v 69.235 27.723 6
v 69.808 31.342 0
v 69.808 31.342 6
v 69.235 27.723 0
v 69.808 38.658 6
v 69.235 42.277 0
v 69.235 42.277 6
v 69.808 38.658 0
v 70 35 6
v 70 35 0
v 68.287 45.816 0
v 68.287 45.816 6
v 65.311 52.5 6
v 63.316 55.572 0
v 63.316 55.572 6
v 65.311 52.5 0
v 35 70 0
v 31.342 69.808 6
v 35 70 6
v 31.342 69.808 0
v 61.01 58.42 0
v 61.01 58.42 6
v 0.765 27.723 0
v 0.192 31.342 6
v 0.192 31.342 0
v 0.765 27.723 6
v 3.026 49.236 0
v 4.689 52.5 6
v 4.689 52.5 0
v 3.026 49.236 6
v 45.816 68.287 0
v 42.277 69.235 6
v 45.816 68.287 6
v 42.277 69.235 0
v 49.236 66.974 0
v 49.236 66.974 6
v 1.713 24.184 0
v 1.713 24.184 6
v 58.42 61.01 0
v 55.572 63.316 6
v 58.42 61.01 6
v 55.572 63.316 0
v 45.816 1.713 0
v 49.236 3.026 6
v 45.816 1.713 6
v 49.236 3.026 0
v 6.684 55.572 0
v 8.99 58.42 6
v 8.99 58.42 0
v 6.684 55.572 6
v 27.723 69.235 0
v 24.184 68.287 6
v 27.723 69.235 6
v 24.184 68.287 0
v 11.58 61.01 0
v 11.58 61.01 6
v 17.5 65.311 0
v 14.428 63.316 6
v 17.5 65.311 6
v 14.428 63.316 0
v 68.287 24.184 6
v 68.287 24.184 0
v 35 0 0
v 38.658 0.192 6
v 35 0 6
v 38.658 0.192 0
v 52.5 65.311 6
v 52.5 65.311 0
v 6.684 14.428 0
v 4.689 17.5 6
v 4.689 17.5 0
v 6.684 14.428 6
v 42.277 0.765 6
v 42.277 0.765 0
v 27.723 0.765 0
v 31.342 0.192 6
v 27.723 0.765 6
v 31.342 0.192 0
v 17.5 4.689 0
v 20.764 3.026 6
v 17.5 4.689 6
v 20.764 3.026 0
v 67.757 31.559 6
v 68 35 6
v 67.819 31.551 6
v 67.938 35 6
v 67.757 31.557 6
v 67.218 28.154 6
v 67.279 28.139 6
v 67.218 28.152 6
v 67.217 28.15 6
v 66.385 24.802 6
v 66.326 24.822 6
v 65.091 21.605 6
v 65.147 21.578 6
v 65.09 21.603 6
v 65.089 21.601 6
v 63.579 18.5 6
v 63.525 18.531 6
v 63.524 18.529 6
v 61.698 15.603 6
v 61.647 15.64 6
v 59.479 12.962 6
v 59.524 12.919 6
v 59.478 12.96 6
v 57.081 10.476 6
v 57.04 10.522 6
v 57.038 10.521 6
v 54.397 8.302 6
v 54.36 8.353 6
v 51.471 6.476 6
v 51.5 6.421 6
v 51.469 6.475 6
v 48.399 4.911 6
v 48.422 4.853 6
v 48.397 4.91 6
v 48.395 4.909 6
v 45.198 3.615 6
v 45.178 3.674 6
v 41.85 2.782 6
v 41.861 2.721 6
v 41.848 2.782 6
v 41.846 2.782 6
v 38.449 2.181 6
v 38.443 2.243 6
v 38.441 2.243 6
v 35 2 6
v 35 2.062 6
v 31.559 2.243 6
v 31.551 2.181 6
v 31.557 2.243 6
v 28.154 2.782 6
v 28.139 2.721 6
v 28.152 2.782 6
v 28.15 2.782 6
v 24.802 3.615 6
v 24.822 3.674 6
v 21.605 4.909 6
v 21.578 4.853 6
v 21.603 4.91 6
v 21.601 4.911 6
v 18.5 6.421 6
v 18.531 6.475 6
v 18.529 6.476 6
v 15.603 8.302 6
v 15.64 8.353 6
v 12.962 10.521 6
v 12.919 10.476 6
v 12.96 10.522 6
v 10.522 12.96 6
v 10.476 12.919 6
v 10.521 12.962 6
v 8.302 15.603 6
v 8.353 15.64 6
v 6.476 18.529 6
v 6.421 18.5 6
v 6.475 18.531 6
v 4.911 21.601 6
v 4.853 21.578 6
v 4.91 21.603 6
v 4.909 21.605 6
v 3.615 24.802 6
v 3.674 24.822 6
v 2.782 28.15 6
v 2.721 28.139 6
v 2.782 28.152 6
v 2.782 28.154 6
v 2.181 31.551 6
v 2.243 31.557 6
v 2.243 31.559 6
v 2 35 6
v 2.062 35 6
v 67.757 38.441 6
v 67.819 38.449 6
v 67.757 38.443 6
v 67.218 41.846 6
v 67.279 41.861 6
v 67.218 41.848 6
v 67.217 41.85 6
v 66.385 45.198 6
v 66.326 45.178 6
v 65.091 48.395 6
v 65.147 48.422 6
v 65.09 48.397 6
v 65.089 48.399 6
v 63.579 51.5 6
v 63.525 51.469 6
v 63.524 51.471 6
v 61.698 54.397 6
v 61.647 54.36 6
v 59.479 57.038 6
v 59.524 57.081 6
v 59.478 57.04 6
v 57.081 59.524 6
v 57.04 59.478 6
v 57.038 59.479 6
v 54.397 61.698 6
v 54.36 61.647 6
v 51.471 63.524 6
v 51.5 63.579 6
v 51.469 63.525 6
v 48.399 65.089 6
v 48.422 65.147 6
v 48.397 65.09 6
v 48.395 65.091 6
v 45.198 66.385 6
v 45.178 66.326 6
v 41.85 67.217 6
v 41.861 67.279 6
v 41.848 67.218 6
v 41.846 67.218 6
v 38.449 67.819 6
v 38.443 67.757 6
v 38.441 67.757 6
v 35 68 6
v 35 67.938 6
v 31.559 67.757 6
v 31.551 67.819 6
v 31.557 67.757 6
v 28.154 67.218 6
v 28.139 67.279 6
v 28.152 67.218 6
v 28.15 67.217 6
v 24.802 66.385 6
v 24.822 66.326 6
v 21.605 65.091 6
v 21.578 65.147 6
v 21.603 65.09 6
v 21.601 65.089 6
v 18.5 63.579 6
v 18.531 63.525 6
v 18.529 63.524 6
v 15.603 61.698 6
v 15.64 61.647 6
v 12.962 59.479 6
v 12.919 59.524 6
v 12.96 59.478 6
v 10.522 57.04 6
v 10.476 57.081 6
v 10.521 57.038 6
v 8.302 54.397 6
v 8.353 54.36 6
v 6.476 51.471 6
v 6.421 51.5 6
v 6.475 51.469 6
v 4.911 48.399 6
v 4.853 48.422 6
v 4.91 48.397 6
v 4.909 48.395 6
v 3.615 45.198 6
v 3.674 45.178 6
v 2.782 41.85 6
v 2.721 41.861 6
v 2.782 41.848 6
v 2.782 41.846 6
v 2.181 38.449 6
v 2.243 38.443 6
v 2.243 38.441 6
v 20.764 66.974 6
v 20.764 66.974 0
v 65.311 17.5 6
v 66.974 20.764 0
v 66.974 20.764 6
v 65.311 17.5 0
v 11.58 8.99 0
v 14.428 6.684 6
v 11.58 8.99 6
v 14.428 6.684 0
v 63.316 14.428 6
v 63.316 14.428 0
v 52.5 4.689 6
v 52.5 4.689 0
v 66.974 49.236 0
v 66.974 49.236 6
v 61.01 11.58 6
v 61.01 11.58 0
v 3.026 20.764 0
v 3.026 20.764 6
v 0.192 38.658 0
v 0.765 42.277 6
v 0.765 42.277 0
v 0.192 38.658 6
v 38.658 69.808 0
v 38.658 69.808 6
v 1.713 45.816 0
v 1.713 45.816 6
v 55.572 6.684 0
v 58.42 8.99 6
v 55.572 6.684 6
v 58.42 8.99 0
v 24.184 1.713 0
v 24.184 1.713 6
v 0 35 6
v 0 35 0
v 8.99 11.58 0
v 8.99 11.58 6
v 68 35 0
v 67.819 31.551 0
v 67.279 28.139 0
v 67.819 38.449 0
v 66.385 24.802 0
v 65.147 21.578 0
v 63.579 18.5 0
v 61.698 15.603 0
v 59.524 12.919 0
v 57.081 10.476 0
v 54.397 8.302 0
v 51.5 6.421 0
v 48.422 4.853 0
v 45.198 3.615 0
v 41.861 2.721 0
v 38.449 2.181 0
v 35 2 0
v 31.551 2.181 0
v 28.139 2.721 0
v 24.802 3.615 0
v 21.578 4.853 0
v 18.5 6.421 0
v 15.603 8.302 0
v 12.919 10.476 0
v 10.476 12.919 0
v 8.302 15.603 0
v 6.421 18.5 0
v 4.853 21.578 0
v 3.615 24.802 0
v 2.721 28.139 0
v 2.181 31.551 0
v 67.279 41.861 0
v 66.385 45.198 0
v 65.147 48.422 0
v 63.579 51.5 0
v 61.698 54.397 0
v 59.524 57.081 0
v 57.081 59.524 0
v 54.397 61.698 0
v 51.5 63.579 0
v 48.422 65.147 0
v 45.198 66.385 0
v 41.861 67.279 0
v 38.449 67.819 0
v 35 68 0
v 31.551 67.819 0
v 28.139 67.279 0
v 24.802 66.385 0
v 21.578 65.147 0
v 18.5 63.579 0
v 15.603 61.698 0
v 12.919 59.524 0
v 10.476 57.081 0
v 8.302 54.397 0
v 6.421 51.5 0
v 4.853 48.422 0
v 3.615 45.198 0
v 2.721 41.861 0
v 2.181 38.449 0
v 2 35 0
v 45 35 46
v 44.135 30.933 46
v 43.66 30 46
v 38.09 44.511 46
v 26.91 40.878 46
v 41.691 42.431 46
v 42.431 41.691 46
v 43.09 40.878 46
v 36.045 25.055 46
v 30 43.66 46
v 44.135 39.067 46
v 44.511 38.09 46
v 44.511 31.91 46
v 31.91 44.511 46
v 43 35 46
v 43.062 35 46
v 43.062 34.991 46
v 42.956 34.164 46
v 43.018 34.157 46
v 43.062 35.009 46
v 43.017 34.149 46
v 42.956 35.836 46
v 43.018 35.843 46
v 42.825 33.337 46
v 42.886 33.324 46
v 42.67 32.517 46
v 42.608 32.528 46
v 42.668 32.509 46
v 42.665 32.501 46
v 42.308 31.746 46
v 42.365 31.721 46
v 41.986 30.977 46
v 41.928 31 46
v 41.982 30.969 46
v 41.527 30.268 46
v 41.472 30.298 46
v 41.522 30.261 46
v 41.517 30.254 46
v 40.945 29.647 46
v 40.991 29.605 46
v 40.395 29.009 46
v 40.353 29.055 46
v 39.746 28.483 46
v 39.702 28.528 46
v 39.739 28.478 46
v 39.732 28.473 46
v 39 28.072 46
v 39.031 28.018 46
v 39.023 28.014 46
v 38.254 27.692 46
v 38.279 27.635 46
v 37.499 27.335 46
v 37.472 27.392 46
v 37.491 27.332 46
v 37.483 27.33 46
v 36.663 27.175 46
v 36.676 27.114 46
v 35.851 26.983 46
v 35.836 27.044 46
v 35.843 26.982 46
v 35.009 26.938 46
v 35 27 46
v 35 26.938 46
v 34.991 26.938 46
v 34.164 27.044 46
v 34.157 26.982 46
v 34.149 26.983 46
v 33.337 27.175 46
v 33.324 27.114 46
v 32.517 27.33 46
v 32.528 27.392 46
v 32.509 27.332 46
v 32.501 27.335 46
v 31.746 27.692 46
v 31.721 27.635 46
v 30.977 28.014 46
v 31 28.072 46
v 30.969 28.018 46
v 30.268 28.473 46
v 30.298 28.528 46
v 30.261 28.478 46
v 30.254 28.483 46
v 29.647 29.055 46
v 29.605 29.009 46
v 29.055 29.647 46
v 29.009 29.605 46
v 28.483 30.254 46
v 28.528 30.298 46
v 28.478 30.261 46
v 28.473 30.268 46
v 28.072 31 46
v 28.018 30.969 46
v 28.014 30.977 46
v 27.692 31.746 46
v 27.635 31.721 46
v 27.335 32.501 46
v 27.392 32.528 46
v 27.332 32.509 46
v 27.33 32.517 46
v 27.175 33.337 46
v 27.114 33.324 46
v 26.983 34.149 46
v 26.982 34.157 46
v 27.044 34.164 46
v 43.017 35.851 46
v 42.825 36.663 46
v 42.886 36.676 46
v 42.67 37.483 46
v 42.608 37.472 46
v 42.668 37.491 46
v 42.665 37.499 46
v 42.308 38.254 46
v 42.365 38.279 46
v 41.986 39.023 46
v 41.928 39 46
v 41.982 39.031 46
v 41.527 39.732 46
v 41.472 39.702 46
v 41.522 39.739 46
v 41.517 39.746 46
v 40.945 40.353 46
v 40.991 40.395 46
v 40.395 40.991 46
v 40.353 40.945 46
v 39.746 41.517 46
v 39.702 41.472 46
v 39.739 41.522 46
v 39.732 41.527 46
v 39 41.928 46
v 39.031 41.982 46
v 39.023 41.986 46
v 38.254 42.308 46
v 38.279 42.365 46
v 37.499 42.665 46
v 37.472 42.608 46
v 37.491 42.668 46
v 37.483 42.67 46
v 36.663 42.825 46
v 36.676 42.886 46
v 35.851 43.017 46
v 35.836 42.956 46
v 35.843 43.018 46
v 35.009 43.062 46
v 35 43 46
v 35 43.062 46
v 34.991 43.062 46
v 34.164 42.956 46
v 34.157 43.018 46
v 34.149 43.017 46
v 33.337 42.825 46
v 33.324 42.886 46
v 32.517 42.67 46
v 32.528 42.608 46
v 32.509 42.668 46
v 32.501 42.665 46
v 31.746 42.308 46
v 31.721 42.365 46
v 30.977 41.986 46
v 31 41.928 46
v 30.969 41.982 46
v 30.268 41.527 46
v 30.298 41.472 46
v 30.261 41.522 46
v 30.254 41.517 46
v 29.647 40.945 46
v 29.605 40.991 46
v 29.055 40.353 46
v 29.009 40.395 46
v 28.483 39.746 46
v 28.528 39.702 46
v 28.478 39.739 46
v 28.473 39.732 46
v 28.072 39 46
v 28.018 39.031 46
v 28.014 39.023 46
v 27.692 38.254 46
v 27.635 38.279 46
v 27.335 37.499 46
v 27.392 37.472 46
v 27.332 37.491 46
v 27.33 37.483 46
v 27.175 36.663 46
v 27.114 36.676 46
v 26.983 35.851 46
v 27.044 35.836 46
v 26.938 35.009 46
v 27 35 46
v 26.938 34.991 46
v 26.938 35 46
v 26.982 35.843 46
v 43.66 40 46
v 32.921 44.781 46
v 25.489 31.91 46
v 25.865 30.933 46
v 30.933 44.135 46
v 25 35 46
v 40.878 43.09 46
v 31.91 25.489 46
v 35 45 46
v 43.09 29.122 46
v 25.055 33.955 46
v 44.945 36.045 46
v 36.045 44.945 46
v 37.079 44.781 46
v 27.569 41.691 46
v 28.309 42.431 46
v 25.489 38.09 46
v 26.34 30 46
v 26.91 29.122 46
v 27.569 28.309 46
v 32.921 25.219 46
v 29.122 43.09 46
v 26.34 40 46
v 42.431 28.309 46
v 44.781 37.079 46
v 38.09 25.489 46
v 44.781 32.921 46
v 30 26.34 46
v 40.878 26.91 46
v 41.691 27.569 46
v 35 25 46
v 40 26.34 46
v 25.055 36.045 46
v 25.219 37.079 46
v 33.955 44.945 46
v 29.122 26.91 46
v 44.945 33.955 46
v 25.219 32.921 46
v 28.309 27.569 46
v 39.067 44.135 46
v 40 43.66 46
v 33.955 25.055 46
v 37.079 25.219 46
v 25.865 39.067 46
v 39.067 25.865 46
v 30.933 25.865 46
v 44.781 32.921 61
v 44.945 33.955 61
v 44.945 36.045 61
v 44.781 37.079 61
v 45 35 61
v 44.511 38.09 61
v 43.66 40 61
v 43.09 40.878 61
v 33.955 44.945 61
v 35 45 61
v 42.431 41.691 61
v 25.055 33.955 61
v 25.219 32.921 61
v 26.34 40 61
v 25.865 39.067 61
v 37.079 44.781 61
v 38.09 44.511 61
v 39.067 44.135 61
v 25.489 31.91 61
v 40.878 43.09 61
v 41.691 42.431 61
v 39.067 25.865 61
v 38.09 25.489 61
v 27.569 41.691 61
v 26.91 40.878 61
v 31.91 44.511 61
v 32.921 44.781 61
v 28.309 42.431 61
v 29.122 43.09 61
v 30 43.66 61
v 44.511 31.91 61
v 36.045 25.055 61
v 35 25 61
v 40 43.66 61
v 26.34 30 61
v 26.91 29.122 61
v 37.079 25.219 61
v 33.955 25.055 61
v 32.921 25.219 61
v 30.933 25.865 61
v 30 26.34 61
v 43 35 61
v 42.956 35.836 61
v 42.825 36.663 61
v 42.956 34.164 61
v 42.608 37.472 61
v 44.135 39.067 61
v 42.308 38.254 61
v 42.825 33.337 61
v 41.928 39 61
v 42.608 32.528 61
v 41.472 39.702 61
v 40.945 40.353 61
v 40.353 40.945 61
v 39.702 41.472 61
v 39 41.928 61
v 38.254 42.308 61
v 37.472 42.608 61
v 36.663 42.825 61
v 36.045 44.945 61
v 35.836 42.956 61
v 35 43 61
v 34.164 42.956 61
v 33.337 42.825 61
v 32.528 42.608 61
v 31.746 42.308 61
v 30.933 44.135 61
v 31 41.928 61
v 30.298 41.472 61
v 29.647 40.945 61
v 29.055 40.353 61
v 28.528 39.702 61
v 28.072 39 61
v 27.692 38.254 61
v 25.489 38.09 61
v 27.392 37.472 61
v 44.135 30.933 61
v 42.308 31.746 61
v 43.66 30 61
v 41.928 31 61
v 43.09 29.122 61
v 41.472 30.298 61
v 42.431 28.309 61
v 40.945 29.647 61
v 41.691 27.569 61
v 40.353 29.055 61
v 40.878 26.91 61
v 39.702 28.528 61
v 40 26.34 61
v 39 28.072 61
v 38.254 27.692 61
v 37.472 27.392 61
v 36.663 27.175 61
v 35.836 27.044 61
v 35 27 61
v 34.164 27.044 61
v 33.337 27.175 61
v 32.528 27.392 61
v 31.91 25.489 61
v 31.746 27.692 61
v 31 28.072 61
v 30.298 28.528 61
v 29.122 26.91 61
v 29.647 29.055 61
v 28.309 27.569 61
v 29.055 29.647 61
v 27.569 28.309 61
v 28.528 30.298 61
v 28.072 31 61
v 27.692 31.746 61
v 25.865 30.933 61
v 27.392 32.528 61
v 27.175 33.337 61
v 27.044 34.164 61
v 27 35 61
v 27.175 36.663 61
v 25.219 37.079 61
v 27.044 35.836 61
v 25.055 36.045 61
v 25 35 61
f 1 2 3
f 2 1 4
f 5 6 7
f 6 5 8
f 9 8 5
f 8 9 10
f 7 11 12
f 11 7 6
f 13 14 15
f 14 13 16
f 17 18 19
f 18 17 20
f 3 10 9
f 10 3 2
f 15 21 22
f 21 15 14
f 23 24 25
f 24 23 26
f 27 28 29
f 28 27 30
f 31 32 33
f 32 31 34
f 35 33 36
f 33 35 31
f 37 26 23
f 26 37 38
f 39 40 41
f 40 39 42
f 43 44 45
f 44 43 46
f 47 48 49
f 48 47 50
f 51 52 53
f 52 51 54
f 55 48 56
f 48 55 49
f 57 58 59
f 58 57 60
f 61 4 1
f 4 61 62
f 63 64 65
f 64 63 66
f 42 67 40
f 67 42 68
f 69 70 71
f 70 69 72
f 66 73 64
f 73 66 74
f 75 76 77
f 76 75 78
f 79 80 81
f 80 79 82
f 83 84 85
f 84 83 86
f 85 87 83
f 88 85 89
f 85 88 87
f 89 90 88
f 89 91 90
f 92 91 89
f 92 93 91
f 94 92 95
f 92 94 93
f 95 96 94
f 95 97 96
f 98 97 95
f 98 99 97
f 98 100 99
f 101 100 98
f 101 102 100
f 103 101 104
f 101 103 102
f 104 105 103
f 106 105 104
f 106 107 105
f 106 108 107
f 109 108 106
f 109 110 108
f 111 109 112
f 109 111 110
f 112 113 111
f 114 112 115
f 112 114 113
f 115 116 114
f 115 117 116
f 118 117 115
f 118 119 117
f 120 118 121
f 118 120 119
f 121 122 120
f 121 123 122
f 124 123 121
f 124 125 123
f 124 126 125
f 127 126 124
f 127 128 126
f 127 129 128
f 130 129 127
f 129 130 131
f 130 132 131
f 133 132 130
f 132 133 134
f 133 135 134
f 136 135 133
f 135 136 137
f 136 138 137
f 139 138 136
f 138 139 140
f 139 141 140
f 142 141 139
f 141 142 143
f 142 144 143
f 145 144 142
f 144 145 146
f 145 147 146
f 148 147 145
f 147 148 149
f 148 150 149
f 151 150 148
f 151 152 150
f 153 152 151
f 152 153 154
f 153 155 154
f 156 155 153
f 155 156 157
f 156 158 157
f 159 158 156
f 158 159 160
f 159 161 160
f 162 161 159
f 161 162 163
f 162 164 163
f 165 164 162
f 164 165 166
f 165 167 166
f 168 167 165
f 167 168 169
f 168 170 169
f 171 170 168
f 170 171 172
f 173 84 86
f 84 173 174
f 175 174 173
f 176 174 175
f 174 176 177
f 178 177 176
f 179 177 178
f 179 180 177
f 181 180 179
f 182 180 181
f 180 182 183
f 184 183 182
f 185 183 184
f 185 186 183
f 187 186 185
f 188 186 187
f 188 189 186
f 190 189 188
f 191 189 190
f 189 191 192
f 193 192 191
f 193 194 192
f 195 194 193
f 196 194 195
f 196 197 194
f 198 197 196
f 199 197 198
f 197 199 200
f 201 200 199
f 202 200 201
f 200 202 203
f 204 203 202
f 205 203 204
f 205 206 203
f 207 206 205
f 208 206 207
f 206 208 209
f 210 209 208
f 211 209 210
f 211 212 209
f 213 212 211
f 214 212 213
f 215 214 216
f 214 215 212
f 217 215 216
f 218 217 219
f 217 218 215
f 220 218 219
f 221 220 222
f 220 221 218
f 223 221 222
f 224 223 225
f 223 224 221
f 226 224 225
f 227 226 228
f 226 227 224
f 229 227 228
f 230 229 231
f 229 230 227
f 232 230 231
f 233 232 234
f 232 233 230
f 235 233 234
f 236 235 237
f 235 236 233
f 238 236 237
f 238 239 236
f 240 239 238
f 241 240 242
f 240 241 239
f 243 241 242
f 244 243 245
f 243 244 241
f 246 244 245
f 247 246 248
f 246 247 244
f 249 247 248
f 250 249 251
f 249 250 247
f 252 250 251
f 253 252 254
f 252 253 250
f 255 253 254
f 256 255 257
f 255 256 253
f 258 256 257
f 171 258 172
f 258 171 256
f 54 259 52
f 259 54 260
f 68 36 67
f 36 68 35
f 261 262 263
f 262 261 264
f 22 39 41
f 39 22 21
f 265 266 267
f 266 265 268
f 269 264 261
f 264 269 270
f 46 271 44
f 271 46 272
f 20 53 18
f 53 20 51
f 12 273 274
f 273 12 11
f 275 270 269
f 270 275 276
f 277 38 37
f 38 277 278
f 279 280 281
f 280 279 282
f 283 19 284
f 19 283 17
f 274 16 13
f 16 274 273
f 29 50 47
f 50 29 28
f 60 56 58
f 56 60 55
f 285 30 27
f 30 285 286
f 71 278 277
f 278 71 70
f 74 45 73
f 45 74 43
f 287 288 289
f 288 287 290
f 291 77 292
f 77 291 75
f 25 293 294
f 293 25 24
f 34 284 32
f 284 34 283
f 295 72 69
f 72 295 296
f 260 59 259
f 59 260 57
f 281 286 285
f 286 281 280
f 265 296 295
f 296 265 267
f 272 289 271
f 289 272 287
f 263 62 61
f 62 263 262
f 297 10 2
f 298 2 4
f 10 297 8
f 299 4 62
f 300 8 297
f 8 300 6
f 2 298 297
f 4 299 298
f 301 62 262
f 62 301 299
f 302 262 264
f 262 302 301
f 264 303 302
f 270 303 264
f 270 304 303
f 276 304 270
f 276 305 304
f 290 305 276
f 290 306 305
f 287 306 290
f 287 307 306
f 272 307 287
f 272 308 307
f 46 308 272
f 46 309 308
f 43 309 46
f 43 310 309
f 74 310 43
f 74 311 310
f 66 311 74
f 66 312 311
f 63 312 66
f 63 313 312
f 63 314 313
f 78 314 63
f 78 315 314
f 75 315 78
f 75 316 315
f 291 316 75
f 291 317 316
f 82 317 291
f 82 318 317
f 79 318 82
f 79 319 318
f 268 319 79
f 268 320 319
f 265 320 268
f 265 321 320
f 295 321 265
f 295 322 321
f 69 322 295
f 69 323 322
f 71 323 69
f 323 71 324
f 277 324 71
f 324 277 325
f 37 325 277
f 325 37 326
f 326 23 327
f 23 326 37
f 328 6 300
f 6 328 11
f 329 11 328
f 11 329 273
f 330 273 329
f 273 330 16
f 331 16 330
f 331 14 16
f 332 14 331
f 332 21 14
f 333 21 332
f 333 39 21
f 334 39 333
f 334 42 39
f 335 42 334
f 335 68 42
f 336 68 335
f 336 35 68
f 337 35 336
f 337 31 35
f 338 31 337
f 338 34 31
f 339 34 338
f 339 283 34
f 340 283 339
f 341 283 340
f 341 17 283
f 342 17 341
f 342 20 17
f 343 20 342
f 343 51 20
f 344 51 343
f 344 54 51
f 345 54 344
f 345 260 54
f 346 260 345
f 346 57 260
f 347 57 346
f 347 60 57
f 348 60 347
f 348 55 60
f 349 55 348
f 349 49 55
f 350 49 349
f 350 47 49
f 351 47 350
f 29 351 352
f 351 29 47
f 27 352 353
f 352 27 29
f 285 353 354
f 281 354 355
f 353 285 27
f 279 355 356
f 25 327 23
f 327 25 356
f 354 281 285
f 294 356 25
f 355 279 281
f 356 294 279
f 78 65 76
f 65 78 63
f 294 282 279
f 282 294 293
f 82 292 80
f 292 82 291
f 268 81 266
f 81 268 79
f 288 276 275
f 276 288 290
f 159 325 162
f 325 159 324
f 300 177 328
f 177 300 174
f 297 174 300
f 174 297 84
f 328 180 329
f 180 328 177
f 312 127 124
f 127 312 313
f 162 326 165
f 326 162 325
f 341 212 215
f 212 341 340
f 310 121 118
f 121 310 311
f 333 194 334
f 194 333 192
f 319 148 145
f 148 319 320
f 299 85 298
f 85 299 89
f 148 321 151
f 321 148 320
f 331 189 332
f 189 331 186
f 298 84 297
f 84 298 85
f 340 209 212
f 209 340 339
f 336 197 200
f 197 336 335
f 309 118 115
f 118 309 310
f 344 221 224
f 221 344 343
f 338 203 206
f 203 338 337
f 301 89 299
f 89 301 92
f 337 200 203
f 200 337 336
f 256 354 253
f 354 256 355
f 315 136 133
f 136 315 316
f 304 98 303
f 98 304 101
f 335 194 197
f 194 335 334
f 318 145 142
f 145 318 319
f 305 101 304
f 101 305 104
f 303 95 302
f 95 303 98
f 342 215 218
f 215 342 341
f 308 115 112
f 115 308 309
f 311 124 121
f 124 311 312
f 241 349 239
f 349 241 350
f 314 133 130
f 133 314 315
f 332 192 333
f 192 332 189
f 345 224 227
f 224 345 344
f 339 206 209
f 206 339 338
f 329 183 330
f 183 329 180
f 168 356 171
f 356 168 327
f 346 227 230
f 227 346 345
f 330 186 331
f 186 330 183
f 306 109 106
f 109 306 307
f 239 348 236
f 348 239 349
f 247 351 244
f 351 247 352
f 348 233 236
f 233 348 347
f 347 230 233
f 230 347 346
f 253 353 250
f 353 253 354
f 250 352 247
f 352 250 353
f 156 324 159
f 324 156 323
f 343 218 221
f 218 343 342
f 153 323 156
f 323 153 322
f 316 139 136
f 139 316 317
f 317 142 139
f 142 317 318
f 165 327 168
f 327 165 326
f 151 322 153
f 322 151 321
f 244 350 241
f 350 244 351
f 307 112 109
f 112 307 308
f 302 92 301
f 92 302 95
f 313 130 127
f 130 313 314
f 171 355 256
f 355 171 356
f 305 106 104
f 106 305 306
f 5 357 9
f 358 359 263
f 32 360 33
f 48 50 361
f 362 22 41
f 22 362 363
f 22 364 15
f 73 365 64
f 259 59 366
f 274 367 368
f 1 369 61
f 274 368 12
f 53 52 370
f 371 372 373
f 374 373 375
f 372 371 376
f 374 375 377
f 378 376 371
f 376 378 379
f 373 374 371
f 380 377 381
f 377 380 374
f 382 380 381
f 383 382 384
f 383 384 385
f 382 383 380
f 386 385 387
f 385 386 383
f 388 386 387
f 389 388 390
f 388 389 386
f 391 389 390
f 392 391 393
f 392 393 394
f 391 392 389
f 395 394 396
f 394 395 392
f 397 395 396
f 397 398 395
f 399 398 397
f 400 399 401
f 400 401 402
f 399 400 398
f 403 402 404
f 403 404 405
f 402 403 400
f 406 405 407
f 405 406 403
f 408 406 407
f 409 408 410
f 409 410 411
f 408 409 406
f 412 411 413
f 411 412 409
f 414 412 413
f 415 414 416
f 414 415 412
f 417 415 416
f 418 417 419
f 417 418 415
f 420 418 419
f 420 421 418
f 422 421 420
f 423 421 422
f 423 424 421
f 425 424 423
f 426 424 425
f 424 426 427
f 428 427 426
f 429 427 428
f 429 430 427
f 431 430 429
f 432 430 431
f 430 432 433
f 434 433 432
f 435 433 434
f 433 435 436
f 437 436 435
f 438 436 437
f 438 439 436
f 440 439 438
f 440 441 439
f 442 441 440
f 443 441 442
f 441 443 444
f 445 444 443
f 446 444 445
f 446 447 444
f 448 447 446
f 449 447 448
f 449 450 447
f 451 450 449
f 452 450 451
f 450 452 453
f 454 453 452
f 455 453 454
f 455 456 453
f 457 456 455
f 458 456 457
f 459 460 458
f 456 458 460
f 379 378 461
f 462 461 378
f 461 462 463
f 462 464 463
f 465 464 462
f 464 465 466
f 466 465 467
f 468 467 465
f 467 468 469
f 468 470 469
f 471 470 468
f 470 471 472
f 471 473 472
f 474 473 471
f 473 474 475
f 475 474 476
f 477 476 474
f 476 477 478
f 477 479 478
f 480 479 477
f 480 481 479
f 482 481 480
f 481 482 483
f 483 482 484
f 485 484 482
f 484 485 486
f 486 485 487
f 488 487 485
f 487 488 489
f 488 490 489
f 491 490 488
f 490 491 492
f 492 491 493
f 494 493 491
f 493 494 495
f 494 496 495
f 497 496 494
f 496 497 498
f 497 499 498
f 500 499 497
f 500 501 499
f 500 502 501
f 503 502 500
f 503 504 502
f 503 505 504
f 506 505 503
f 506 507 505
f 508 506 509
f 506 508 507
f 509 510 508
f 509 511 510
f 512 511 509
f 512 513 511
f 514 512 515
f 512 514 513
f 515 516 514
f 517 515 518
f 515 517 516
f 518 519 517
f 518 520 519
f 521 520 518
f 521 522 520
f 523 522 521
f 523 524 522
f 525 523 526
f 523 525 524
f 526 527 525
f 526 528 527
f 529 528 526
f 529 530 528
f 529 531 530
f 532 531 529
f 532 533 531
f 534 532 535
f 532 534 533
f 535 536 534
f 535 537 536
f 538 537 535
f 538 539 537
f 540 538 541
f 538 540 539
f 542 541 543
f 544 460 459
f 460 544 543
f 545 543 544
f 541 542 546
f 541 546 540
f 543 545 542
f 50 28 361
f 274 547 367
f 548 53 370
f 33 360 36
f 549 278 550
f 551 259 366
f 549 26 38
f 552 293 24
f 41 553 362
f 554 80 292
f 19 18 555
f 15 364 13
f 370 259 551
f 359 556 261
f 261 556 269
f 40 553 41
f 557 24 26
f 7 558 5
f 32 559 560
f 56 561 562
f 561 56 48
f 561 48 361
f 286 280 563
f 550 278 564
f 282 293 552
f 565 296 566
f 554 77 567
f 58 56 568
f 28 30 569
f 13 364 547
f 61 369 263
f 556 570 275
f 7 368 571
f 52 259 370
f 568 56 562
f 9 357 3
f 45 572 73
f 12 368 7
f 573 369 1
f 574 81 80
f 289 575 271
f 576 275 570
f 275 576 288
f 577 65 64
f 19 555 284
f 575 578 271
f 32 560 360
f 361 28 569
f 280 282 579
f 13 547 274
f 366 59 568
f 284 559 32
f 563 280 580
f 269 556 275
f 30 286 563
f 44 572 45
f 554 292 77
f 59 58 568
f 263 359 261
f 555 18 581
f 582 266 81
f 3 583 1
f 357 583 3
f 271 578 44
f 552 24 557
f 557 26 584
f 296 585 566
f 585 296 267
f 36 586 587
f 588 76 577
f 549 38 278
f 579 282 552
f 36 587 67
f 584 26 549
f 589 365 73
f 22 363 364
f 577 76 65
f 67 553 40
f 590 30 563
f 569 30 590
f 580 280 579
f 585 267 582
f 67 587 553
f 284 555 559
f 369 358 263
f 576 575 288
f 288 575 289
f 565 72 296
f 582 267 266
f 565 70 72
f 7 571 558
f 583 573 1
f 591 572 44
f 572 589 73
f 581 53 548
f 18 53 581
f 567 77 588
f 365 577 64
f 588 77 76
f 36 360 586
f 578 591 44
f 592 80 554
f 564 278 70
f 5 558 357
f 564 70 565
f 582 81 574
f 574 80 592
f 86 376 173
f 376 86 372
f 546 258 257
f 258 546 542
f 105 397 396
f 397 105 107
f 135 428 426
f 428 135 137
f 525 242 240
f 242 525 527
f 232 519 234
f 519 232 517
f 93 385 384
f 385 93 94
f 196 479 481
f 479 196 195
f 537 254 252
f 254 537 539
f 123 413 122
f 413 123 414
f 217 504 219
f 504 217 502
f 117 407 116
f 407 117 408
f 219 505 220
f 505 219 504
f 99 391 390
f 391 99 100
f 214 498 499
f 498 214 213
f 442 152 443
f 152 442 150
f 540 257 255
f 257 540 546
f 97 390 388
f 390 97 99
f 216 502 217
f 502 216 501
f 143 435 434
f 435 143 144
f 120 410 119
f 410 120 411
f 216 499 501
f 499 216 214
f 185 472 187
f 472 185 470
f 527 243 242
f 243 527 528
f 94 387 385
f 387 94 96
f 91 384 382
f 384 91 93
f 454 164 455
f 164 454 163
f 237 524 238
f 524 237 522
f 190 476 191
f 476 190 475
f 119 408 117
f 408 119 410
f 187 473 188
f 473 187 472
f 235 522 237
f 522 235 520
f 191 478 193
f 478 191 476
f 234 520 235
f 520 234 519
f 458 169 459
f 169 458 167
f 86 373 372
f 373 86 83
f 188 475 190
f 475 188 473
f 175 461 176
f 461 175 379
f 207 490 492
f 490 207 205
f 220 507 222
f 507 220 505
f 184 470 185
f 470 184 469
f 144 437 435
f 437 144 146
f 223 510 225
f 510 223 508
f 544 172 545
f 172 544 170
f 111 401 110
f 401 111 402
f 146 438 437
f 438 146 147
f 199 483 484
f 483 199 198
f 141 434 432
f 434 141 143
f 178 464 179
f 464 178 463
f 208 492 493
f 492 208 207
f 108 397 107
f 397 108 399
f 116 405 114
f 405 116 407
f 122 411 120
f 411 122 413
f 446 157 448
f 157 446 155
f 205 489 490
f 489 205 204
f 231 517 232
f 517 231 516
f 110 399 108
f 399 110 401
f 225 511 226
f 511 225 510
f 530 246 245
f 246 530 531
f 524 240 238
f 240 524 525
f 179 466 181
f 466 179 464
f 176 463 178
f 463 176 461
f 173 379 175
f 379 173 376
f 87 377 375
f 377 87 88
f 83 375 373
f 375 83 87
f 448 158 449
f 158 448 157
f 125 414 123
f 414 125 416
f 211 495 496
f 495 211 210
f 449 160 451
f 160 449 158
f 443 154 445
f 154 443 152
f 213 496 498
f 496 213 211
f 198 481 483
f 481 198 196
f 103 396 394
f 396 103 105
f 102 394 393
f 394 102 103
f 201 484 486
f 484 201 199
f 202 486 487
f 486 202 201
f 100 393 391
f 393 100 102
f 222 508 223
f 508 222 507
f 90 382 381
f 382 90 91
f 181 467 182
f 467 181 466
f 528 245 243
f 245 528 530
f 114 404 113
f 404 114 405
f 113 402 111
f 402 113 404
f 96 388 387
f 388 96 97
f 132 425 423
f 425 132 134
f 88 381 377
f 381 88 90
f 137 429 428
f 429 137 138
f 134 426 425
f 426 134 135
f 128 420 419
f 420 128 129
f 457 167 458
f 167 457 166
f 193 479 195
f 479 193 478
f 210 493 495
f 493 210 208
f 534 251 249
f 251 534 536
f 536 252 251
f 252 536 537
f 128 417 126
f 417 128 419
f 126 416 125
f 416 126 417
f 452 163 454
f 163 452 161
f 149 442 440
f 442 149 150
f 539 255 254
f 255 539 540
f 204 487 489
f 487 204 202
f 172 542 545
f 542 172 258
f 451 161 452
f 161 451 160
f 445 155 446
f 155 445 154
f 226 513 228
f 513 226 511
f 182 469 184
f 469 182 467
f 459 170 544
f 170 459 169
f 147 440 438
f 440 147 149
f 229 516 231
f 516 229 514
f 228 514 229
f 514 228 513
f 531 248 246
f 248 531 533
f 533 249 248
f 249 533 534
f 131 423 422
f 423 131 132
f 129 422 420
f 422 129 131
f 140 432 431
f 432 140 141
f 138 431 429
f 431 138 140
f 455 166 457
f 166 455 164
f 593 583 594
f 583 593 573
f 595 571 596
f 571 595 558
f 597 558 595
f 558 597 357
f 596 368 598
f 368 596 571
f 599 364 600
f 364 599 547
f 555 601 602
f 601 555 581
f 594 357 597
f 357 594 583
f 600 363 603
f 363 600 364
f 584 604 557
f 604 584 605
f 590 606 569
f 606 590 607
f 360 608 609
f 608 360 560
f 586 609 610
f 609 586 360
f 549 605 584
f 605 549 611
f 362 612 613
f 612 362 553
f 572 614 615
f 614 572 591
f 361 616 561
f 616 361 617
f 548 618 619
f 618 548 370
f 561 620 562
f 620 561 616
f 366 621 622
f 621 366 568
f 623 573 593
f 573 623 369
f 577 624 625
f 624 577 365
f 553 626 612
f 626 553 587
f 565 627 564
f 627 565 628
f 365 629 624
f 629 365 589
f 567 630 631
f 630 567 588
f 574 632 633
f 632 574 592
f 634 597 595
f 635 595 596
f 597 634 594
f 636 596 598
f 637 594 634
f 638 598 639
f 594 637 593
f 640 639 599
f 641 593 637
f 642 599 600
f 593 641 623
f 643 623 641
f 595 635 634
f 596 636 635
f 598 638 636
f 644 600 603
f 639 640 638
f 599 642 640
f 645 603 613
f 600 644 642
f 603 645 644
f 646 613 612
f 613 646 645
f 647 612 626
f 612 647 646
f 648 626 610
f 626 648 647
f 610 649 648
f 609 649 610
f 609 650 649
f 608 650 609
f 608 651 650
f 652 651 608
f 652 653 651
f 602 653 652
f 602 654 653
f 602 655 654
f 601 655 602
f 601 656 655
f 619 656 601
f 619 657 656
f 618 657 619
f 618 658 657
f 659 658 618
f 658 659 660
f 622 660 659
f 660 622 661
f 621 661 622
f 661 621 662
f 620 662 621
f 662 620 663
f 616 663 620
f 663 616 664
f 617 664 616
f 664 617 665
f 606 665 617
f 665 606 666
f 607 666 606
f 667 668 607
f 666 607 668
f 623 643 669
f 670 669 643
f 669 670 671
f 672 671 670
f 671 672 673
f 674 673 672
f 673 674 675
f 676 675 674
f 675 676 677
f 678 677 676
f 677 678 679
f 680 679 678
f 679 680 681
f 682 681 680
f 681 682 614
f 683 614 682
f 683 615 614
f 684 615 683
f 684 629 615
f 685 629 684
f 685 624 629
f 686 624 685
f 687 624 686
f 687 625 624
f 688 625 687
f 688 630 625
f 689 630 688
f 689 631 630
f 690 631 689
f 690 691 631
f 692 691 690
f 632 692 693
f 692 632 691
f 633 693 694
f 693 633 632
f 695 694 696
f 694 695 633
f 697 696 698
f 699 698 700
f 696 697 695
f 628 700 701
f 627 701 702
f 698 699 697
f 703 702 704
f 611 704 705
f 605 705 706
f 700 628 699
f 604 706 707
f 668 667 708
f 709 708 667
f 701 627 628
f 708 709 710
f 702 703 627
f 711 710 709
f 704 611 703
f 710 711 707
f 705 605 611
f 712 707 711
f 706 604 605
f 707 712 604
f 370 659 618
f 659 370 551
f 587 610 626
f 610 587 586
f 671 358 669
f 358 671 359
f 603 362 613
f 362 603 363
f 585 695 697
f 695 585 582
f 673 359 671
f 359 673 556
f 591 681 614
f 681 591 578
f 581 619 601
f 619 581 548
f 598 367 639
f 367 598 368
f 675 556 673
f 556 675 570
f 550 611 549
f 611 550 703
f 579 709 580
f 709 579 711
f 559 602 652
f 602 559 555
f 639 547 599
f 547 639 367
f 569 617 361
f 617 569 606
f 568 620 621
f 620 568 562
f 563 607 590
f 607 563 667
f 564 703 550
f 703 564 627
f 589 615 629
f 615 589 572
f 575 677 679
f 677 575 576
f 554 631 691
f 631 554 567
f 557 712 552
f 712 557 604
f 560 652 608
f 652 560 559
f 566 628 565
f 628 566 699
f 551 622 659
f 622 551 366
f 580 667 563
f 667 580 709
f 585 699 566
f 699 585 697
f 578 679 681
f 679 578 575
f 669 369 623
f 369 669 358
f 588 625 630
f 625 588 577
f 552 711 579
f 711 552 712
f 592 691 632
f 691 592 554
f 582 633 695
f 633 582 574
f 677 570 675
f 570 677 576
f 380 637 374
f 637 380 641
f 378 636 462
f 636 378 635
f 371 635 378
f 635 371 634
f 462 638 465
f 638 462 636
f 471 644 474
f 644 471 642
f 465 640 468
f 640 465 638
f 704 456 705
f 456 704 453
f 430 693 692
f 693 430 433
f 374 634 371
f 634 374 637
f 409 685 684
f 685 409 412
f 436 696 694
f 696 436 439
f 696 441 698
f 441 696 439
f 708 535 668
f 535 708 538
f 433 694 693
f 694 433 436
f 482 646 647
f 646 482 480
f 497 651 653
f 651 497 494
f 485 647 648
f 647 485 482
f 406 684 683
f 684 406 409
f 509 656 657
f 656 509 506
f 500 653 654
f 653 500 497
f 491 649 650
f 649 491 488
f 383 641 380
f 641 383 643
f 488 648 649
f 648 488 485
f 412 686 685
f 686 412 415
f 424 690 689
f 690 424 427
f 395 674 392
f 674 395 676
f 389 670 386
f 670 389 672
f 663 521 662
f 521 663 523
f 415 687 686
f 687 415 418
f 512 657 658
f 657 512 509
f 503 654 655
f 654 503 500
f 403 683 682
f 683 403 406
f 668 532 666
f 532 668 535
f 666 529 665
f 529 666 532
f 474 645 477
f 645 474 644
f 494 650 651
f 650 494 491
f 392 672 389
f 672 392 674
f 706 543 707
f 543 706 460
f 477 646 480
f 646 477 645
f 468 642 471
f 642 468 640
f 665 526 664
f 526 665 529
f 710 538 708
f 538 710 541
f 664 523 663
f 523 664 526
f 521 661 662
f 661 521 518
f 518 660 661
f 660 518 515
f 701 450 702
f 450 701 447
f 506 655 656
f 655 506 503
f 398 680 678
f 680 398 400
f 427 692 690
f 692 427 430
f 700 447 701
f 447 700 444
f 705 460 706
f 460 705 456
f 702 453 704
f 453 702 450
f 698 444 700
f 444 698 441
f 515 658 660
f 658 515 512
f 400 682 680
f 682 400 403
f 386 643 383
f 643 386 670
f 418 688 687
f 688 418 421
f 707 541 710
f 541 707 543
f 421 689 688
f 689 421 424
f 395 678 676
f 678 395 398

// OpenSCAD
// =============================================
// 3D: funnel — воронка из 3 модулей
// Version: 1.0
// =============================================

description = "Parametric funnel: base ring, conical body, neck"; // one-line short description
version_str = "1.0";

// -------------------------------------------------
// Комментарии / Состав фрагментов
// -------------------------------------------------
// Фрагменты (все размеры задаются ниже параметрами):
// - p1_base()   — нижнее основание (цилиндр‑обод) высотой P1_H и диаметром P1_D
// - p2_frustum()— конический участок (усечённый конус) высотой P2_H
// - p3_neck()   — горлышко (цилиндр) высотой P3_H и диаметром P3_D
// Главная деталь base() = union(p1_base, p2_frustum, p3_neck)

// -------------------------------------------------
// Параметры модели (внешние габариты) и настройки
// -------------------------------------------------
// Геометрия
P1_D = 70;     // нижний внешний диаметр основания (мм)
P1_H = 6;      // высота основания (мм)
P2_H = 40;     // высота усечённого конуса (мм)
P3_D = 20;     // внешний диаметр горлышка (мм)
P3_H = 15;     // высота горлышка (мм)

wall_th = 2.0; // толщина стенок воронки (мм)

// Фаски/скругления (минимальные по умолчанию)
edge_ch_base = 0;   // фаска по верхнему краю основания (мм)
edge_ch_neck = 0;   // фаска по верхнему краю горлышка (мм)

// Опциональное скругление краёв всей детали через Minkowski
// Примечание: если mink_r > 0, внешние габариты увеличатся примерно на 2*mink_r
mink_r = 0;    // радиус скругления по краям (мм). 0 — без скругления

// Вывод фрагментов
print_base = true;     // печатать главную деталь base (все 3 фрагмента)
print_p1 = false;      // печатать отдельно фрагмент p1_base
print_p2 = false;      // печатать отдельно фрагмент p2_frustum
print_p3 = false;      // печатать отдельно фрагмент p3_neck

// -------------------------------------------------
// Подключение общих модулей
// -------------------------------------------------
use <../modules.scad>;

// -------------------------------------------------
// Настройка точности
// -------------------------------------------------
$fn = 0;        // фиксированную сегментацию отключаем
$fa = 6;        // 5–8° обычно достаточно
$fs = 0.35;     // ≈ диаметр сопла (0.3–0.5 для сопла 0.4)
pin_fs = 0.25;  // чуть тоньше для штырей и отверстий

// -------------------------------------------------
// Вычисляемые переменные и вспомогательные
// -------------------------------------------------
total_h = P1_H + P2_H + P3_H;  // общая высота воронки (без учёта mink_r)

// Внутренние диаметры (равномерная толщина стенок по диаметрам)
P1_D_in = max(P1_D - 2*wall_th, 0.5);
P3_D_in = max(P3_D - 2*wall_th, 0.5);

// Конус: внутренние диаметры линейно изменяются от P1_D_in (снизу) до P3_D_in (сверху)
// Никаких дополнительных отступов не требуется: слой материалов = wall_th по радиусу

// Вывод позиционируем в положительные X,Y для корректной обрезки test_fragment
// Для этого строим в центре, затем переносим на [P1_D/2, P1_D/2, 0]

// -------------------------------------------------
// Фрагменты детали
// -------------------------------------------------
module p1_base(){
  // Основание — кольцо
  translate([P1_D/2, P1_D/2, 0])
    difference(){
      cylinder(h=P1_H, d=P1_D);
      translate([0,0,-eps()]) cylinder(h=P1_H + 2*eps(), d=P1_D_in, $fs=pin_fs, $fa=6);
    }
  // Верхняя фаска основания (опционально)
  if (edge_ch_base > 0){
    translate([P1_D/2, P1_D/2, P1_H - edge_ch_base])
      chamfer_ring(d_outer=P1_D, d_inner=P1_D_in, h=edge_ch_base, chamfer=edge_ch_base);
  }
}

module p2_frustum(){
  // Участок усечённого конуса
  translate([P1_D/2, P1_D/2, P1_H])
    difference(){
      cylinder(h=P2_H, d1=P1_D, d2=P3_D);
      translate([0,0,-eps()])
        cylinder(h=P2_H + 2*eps(), d1=P1_D_in, d2=P3_D_in, $fs=pin_fs, $fa=6);
    }
}

module p3_neck(){
  // Горлышко — цилиндрическая труба
  translate([P1_D/2, P1_D/2, P1_H + P2_H])
    difference(){
      cylinder(h=P3_H, d=P3_D);
      translate([0,0,-eps()]) cylinder(h=P3_H + 2*eps(), d=P3_D_in, $fs=pin_fs, $fa=6);
    }
  if (edge_ch_neck > 0){
    translate([P1_D/2, P1_D/2, P1_H + P2_H + P3_H - edge_ch_neck])
      chamfer_ring(d_outer=P3_D, d_inner=P3_D_in, h=edge_ch_neck, chamfer=edge_ch_neck);
  }
}

// Главная деталь
module base(){
  union(){
    p1_base();
    p2_frustum();
    p3_neck();
  }
}

// Обёртка для Minkowski скругления (без сохранения габаритов)
module base_with_rounding(){
  if (mink_r > 0){
    minkowski(){
      base();
      sphere(r=mink_r, $fs=pin_fs, $fa=6);
    }
  } else base();
}

// Вывод всех фрагментов
module all_details(){
  if (print_base) base_with_rounding();
  if (print_p1) translate([P1_D + 10, 0, 0]) p1_base();
  if (print_p2) translate([P1_D + 10, P1_D + 10, 0]) p2_frustum();
  if (print_p3) translate([0, P1_D + 10, 0]) p3_neck();
}

// Финальная ориентация/обрезка для тест‑фрагментов
module orient(){ children(); }

// -------------------------------------------------
// ВЫВОД МОДЕЛИ
// -------------------------------------------------
module render(){
  // clip_for_fragments() берёт test_fragment/frag_* из моделей/modules.scad
  clip_for_fragments(){ orient(){ all_details(); } }
}

render();
